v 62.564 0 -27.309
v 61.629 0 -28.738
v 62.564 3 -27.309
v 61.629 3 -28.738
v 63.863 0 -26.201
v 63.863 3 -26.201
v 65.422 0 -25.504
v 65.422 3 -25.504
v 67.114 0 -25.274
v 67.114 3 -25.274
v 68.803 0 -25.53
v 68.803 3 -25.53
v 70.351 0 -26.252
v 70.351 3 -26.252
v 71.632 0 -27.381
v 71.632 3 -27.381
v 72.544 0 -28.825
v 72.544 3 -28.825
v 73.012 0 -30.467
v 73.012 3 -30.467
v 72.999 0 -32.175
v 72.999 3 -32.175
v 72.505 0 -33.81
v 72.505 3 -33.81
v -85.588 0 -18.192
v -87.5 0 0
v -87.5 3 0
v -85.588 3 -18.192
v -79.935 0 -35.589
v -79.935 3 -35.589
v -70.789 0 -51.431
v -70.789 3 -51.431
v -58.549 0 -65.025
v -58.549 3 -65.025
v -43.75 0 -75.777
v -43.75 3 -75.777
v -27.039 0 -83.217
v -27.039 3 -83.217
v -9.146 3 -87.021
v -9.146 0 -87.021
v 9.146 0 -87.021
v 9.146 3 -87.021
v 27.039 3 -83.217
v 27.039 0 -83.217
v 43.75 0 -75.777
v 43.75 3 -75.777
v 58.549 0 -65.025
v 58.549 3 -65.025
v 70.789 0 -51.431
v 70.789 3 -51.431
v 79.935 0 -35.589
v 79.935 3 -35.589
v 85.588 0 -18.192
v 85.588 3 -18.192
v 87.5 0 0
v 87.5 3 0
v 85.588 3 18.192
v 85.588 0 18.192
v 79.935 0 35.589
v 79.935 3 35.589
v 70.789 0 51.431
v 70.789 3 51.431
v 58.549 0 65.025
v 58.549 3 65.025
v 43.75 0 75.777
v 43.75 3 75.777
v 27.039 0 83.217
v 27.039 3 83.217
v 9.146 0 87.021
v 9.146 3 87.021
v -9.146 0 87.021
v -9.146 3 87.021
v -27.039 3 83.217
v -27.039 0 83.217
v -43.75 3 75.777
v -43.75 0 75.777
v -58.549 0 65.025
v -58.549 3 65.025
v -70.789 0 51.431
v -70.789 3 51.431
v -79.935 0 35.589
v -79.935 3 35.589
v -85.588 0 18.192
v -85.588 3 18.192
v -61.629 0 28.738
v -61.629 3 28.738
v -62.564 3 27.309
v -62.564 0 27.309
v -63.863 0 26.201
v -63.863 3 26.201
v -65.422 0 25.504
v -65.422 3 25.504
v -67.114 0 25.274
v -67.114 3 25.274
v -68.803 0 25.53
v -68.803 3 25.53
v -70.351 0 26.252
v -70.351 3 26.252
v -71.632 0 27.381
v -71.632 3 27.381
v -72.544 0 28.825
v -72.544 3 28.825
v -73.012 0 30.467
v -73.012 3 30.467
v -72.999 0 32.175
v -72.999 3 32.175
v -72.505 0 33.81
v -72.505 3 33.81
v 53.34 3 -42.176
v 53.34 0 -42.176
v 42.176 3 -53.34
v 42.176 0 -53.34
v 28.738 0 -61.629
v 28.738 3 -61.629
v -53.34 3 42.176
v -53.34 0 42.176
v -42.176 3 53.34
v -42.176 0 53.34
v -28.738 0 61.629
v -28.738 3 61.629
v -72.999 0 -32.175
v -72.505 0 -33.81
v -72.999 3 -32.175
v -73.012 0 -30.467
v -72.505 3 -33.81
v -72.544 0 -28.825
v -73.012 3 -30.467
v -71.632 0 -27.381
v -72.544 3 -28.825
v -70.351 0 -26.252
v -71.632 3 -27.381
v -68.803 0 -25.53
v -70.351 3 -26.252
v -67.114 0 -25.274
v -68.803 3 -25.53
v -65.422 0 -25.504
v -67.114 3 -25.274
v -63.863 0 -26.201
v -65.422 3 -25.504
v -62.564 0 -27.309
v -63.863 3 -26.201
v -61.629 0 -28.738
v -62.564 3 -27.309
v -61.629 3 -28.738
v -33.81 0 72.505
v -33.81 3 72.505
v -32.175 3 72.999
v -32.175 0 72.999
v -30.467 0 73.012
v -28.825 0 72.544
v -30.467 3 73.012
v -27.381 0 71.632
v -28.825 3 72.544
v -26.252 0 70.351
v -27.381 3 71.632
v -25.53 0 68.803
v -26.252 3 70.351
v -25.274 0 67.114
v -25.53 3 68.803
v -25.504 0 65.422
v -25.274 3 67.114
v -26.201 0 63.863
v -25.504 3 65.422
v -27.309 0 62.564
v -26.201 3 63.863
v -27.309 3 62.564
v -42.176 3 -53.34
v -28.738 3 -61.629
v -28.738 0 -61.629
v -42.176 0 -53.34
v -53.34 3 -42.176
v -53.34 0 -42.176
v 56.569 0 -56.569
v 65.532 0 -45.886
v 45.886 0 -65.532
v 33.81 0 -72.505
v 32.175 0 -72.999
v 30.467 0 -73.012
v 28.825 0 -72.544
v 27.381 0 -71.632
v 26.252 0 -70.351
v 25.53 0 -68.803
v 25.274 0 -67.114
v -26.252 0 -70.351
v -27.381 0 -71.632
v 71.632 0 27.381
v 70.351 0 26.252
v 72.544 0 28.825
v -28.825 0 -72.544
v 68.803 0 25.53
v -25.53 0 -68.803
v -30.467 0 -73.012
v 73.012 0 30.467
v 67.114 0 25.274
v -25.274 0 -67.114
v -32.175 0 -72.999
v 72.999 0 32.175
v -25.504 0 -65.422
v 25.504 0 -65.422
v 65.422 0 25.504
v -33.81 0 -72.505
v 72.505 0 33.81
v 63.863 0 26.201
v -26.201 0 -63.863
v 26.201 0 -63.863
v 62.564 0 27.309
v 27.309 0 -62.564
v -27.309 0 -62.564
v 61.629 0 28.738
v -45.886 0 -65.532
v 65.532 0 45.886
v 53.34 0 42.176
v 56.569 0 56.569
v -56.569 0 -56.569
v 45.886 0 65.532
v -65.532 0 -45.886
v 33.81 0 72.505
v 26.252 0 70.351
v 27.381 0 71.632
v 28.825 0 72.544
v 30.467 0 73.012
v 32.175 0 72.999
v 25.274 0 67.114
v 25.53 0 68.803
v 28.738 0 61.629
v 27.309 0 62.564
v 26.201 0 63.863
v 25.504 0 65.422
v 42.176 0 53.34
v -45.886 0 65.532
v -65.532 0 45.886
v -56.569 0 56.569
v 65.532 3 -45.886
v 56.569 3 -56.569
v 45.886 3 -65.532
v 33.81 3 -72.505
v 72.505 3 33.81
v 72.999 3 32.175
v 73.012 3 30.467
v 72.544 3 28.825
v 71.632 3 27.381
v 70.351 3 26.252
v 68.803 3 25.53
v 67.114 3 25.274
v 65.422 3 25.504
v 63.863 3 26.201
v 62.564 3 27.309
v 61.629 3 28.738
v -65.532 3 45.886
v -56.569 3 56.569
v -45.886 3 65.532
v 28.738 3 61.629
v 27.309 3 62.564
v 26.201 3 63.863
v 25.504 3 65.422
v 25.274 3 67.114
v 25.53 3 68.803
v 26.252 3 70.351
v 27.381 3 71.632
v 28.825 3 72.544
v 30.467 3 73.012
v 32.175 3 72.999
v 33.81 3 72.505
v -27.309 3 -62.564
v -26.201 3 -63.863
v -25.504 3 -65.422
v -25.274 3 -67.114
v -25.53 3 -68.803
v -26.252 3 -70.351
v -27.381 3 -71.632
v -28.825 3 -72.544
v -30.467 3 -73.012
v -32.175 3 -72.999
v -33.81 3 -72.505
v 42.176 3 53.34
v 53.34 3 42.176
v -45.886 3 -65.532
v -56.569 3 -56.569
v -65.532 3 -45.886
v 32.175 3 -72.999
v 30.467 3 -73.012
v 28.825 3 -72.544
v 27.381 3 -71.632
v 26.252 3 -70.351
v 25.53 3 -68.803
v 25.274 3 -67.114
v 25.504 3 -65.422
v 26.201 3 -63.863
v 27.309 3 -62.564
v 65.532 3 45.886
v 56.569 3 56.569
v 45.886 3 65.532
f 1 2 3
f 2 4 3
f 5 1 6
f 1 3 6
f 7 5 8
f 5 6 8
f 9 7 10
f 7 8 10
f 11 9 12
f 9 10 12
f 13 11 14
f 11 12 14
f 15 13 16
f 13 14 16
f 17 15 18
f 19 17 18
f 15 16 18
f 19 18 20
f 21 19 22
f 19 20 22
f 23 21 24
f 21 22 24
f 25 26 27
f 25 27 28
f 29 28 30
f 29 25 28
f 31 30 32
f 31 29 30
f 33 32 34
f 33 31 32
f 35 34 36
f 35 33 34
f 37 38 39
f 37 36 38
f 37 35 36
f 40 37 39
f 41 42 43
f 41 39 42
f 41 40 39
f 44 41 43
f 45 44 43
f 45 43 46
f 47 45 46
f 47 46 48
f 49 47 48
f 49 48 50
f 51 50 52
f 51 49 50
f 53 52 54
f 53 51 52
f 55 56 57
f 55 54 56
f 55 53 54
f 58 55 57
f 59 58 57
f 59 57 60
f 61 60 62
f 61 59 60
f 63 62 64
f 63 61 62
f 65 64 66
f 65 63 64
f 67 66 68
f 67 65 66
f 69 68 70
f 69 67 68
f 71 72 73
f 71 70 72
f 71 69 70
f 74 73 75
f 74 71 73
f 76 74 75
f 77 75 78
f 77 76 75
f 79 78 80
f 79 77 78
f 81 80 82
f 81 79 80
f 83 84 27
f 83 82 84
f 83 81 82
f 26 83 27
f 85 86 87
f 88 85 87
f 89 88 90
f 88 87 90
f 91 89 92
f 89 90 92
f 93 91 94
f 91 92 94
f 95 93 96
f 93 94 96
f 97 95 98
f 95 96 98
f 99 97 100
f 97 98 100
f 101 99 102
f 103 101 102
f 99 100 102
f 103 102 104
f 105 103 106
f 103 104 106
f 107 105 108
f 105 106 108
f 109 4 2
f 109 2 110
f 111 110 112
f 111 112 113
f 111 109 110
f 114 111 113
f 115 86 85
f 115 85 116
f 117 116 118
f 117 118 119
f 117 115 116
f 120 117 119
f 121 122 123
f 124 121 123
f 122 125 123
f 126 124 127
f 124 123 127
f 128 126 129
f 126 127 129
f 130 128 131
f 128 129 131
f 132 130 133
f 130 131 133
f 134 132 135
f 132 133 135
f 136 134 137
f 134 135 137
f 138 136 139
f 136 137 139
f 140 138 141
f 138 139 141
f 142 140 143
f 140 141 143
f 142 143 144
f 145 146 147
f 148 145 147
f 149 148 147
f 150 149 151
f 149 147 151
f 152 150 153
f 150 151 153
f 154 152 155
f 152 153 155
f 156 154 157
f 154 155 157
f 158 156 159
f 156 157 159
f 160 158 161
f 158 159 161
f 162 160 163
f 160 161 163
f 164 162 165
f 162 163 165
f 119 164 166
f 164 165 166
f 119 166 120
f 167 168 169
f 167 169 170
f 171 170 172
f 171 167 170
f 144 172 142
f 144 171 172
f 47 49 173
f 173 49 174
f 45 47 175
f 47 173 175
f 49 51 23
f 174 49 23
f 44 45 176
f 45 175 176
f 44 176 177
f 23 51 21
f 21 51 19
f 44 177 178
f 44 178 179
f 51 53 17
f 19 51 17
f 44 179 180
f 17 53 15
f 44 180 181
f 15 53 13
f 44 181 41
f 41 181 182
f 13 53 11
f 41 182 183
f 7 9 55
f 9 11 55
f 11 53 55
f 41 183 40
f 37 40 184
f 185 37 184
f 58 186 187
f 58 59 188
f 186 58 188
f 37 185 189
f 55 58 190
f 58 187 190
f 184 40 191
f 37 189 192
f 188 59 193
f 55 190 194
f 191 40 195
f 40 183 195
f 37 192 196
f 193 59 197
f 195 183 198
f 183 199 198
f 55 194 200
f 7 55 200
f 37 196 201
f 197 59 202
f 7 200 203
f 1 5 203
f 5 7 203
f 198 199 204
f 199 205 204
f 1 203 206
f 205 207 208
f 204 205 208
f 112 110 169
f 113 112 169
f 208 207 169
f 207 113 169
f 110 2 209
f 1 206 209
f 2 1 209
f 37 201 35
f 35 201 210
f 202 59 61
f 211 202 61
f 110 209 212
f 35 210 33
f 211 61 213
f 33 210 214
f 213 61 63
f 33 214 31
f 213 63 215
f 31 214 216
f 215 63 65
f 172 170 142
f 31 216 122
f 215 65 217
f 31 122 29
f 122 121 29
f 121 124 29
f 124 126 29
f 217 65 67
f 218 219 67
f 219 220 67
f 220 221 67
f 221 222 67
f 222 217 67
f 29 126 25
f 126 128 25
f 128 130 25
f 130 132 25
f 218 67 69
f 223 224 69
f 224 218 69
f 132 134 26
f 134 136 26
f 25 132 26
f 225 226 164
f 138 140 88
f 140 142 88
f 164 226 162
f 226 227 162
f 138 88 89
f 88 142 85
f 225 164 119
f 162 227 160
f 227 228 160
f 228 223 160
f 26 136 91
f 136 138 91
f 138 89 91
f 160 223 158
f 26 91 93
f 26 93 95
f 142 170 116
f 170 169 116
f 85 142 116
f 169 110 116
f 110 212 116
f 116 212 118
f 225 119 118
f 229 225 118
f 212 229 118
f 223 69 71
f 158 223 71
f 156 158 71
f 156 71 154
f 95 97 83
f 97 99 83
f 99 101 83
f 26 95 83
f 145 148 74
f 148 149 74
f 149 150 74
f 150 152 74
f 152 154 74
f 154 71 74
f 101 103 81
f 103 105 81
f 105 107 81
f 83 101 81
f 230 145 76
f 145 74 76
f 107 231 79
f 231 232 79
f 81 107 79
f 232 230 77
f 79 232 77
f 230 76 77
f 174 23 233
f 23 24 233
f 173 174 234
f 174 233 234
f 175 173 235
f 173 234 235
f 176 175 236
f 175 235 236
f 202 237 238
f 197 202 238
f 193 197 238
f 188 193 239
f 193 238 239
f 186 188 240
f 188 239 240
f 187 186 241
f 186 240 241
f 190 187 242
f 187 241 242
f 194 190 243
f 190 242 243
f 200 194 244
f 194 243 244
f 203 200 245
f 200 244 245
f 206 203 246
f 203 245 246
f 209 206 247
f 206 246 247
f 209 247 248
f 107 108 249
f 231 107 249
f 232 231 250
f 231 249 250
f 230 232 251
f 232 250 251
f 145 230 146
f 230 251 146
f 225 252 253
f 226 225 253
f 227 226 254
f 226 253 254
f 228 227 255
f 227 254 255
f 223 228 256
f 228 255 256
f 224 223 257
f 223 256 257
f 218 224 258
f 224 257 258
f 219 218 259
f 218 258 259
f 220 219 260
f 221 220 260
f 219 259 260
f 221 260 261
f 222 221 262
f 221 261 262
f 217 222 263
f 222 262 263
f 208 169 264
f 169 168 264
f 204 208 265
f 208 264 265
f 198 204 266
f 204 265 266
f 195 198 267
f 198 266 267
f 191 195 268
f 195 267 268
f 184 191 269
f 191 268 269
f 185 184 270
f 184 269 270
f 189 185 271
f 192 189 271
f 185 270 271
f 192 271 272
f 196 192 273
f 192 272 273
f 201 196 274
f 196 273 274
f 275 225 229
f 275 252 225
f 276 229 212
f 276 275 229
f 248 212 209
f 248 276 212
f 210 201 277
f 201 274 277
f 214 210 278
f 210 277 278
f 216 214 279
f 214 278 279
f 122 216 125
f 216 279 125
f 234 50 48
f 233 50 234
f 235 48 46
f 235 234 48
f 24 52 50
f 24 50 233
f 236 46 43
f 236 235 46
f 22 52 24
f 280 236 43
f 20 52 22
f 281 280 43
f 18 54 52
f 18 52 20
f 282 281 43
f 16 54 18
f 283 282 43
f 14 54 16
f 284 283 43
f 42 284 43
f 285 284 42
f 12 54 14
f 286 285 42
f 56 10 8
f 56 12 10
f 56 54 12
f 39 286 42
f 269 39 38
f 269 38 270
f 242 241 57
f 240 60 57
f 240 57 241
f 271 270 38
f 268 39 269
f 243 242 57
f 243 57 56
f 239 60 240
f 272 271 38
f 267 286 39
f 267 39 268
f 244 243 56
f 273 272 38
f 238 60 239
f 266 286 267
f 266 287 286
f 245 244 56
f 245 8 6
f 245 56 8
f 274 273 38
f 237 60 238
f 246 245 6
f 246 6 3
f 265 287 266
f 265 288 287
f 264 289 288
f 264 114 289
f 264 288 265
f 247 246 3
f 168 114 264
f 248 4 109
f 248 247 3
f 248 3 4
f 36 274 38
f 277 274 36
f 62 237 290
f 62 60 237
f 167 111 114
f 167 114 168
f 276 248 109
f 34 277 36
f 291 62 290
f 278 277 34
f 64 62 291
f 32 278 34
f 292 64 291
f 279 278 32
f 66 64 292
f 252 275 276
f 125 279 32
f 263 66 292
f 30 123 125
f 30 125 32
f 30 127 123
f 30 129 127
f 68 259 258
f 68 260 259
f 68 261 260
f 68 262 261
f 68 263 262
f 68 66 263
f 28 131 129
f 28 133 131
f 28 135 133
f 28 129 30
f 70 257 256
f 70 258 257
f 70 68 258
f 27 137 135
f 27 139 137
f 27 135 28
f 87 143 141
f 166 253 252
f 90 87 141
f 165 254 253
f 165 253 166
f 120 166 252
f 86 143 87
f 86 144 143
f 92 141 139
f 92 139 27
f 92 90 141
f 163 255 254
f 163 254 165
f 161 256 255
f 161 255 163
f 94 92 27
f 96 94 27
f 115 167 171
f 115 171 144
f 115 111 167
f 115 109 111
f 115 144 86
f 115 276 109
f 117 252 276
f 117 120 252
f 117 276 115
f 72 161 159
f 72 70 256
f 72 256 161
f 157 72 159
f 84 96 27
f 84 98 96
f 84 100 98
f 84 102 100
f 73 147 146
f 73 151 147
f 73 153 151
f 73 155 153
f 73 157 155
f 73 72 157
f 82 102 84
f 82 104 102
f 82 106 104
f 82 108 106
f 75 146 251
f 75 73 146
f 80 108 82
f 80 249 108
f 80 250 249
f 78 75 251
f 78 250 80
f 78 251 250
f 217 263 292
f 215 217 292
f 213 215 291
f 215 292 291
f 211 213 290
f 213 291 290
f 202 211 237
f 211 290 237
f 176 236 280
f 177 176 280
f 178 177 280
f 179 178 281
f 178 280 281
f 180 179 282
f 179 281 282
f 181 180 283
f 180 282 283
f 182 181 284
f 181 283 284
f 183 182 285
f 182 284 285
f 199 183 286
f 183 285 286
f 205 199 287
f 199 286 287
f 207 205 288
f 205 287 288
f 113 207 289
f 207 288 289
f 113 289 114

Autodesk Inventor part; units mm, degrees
ref_plane "YZ Plane" through (0, 0, 0) normal (1, 0, 0) x (0, 1, 0)
ref_plane "XZ Plane" through (0, 0, 0) normal (0, 1, 0) x (-1, 0, 0)
ref_plane "XY Plane" through (0, 0, 0) normal (0, 0, 1) x (1, 0, 0)
sketch "Sketch1" plane through (0, 0, 0) normal (0, 1, 0) x (-1, 0, 0)
  circle A0 centre (0, 0) radius 87.5
  dimension "d0" = 175
extrude "Plate1" add sketch "Sketch1" along normal blind 3
sketch "Sketch2" plane through (0, 3, 0) normal (0, 1, 0) x (1, 0, 0)
  line L0 (-40, -40) -> (40, -40) construction
  line L1 (40, -40) -> (40, 40) construction
  line L2 (40, 40) -> (-40, 40) construction
  line L3 (-40, 40) -> (-40, -40) construction
  line L4 (-40, -40) -> (40, 40) construction
  circle A0 centre (0, 0) radius 87.5 projected
  circle A1 centre (0, 0) radius 74 construction
  circle A2 centre (-67.0668, -31.2738) radius 6
  line L5 (-67.0668, -31.2738) -> (0, 0) construction
  circle A3 centre (-31.2738, -67.0668) radius 6
  line L6 (-31.2738, -67.0668) -> (0, 0) construction
  arc A4 (-72.5046, -33.8095) -> (-33.8095, -72.5046) centre (0, 0) ccw
  arc A5 (-61.6289, -28.738) -> (-28.738, -61.6289) centre (0, 0) ccw
  point P0 (-61.6289, -28.738)
  point P1 (-28.738, -61.6289)
  dimension "d7" = 12
  dimension "d9" = 12
  dimension "d2" = 80
  dimension "d3" = 80
  dimension "d16" = 40
  dimension "d17" = 20
  dimension "d18" = 13.5
extrude "Extrusion1" cut sketch "Sketch2" against normal through all contours A2 | A2 A5 A3 A4 | A3
pattern_circular "Circular Pattern1" count 4 over 360 about axis through (0, -10, 0) along (0, 1, 0) of "Extrusion1"
equation "\"d9\" = d7"
equation "\"BendReliefWidth\" = Thickness"
equation "\"BendReliefDepth\" = 0.5 * Thickness"
equation "\"CornerReliefSize\" = 4 * Thickness"
equation "\"MinimumRemnant\" = 2 * Thickness"
equation "\"TransitionRadius\" = BendRadius"
equation "\"JacobiRadiusSize\" = BendRadius"
equation "\"GapSize\" = Thickness"
properties part number "MSC 126 flange frame" material "Stainless Steel"
